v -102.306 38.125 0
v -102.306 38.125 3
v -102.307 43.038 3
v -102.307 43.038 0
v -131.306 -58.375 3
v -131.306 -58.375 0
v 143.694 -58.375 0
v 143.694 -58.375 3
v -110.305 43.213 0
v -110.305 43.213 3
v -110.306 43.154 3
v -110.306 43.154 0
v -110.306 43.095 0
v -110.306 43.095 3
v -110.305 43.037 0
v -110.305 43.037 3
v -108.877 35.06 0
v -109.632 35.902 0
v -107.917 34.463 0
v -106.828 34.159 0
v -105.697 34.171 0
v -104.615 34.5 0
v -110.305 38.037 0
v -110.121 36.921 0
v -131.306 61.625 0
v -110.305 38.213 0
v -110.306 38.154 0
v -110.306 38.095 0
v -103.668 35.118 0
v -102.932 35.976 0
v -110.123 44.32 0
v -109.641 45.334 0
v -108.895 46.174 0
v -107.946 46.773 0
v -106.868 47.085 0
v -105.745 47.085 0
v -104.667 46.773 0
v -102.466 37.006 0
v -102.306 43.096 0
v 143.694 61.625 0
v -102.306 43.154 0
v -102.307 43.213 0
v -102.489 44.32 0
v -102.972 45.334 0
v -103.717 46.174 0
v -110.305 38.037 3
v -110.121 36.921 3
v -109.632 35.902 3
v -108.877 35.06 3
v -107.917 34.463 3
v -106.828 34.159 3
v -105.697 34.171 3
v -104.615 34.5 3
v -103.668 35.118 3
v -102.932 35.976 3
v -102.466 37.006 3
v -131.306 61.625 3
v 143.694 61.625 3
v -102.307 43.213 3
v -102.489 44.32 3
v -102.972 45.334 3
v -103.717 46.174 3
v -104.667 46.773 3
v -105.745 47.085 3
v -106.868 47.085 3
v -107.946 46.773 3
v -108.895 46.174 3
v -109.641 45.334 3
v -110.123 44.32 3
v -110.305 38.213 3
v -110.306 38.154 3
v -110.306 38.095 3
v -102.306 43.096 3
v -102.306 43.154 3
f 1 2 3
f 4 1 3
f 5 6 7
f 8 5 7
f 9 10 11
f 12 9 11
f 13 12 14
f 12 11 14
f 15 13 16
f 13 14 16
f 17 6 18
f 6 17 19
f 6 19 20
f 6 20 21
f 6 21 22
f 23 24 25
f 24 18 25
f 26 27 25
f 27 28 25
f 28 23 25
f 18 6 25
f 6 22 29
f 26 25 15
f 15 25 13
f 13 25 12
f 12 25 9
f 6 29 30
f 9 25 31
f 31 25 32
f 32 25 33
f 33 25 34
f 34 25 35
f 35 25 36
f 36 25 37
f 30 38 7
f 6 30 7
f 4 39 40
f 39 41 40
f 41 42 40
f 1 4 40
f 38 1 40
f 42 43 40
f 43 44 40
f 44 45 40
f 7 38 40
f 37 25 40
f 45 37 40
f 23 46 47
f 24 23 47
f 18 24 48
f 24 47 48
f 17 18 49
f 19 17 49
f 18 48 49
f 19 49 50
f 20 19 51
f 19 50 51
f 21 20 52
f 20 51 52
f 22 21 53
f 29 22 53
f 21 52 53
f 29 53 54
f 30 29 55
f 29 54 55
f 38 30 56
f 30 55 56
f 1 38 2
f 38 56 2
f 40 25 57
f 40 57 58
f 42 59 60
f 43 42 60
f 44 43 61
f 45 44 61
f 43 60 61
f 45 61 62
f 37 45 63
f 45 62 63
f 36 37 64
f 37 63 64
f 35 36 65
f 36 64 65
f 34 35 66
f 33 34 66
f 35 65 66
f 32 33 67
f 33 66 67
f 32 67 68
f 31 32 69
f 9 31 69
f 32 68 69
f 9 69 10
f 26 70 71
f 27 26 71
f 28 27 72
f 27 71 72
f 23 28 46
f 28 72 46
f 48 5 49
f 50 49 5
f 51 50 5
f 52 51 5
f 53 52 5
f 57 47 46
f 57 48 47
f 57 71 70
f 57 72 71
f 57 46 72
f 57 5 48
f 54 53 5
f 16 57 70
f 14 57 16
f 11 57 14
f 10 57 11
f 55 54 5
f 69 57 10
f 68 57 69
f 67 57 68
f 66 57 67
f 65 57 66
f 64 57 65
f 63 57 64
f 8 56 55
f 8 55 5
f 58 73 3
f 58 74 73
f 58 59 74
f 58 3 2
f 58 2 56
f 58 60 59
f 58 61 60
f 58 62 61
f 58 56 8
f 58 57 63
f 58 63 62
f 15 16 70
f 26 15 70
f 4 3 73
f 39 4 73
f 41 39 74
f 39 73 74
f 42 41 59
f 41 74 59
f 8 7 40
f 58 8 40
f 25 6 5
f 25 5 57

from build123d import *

# Parameters (mm, degrees)
F0_W     = 275
F0_H     = 120
F1_DEPTH = 3
F3_DEPTH = 3


with BuildPart() as f1:
    # F0 (on Top) → F1 (new body)
    with BuildSketch(Plane.XY):
        with Locations((6.193666, 1.624569)):
            Rectangle(F0_W, F0_H)
    extrude(amount=F1_DEPTH)

    # F2 (on face) → F3 (cut)
    with BuildSketch(Plane.XY.offset(3)):
        with BuildLine():
            Line((-102.307304, 43.212634), (-102.30727, 43.038028))
            ThreePointArc((-102.30727, 43.038028), (-102.306334, 43.125331), (-102.307304, 43.212634))
        make_face()
        with BuildLine():
            Line((-102.306334, 38.125331), (-102.30727, 43.038028))
            Line((-102.30727, 43.038028), (-102.307304, 43.212634))
            ThreePointArc((-102.307304, 43.212634), (-106.306334, 47.124569), (-110.305365, 43.212634))
            Line((-110.305365, 43.212634), (-110.305365, 43.036504))
            Line((-110.305365, 43.036504), (-110.305365, 38.212634))
            Line((-110.305365, 38.212634), (-110.305365, 38.036504))
            ThreePointArc((-110.305365, 38.036504), (-106.261918, 34.124816), (-102.306334, 38.125331))
        make_face()
        with BuildLine():
            Line((-110.305365, 43.036504), (-110.305365, 43.212634))
            ThreePointArc((-110.305365, 43.212634), (-110.306334, 43.124569), (-110.305365, 43.036504))
        make_face()
        with BuildLine():
            ThreePointArc((-110.305365, 38.212634), (-110.306334, 38.124569), (-110.305365, 38.036504))
            Line((-110.305365, 38.036504), (-110.305365, 38.212634))
        make_face()
    extrude(amount=-F3_DEPTH, mode=Mode.SUBTRACT)


solid = f1.part
